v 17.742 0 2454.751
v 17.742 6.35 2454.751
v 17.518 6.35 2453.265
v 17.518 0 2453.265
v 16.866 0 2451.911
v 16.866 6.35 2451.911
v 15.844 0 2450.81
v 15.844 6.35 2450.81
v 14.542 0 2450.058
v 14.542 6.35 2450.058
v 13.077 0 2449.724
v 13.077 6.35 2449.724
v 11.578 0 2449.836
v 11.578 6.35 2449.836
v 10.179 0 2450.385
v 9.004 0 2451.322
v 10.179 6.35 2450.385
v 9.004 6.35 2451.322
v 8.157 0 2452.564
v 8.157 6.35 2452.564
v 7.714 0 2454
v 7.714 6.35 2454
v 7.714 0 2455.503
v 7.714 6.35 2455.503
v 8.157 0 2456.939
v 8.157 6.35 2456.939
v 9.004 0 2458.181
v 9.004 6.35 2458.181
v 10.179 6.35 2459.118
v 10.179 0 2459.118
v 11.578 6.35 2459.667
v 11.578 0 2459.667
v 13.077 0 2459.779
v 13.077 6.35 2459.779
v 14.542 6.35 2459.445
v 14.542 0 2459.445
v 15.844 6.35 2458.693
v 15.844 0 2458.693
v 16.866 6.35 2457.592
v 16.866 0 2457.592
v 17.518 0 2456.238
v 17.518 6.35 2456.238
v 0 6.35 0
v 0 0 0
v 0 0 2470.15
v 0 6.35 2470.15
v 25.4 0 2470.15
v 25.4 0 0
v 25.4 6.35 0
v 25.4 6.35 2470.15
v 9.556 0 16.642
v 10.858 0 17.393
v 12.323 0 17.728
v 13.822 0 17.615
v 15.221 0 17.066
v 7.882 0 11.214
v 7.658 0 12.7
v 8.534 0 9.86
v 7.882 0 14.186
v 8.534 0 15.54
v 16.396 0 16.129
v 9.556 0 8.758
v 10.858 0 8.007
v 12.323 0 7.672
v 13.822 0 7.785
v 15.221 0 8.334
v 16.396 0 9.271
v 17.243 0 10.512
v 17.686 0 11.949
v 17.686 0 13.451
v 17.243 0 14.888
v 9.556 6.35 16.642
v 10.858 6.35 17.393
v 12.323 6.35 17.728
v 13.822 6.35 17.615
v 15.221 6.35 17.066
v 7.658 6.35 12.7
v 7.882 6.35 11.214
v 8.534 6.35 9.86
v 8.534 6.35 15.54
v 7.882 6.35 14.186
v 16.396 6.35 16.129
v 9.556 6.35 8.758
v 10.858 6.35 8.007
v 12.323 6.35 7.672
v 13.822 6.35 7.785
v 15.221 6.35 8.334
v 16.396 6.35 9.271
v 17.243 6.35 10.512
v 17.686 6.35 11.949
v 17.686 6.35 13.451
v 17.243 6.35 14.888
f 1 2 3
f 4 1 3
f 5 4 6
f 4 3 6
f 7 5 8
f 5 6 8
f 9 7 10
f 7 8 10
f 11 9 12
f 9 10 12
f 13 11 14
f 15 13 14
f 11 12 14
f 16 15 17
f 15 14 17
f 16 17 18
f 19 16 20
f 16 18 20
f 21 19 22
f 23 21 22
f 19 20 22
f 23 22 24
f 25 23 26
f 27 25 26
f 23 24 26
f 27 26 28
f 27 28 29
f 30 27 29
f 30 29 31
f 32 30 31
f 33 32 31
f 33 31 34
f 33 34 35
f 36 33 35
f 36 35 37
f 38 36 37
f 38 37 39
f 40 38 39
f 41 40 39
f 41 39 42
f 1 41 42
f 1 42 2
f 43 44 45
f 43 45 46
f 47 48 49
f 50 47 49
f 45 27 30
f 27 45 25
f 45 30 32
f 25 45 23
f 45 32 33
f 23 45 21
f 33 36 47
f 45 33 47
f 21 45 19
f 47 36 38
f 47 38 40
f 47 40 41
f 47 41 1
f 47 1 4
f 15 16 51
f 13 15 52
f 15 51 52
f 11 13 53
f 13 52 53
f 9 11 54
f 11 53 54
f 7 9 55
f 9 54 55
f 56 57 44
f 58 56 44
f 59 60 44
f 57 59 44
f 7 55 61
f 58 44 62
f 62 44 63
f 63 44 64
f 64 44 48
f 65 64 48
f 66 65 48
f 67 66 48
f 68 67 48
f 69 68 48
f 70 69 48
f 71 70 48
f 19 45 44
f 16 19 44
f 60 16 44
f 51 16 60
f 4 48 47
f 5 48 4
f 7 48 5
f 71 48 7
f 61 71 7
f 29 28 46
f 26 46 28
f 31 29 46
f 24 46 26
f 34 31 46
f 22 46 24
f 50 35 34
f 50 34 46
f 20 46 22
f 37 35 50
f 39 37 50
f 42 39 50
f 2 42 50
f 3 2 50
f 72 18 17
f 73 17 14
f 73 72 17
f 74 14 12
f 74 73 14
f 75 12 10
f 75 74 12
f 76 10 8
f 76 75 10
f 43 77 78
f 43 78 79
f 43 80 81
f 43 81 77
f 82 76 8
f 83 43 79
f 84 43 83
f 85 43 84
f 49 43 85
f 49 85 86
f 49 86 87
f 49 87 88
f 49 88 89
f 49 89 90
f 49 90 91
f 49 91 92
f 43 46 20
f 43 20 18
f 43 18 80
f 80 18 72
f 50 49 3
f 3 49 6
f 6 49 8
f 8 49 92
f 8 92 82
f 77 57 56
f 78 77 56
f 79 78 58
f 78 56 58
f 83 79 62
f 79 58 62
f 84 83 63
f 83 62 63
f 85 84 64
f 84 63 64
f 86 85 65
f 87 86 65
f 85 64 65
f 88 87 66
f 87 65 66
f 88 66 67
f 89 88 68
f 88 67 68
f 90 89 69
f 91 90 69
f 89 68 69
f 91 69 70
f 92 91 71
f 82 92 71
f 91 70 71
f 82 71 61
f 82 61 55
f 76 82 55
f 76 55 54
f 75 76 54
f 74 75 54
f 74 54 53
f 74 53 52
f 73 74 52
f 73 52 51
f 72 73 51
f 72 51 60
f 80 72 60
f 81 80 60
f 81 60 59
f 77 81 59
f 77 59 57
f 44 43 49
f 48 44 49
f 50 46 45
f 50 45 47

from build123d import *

# Parameters (mm, degrees)
SKETCH1_W                = 25.4
SKETCH1_H                = 6.35
BOSS_EXTRUDE1_DEPTH      = 2470.15
X_0_397_DIAMETER_HOLE1_D = 10.0838
X_0_397_DIAMETER_HOLE2_D = 10.0838


with BuildPart() as part:
    # Sketch1 → Boss-Extrude1 (new body)
    with BuildSketch(Plane.XY):
        with Locations((12.7, 3.175)):
            Rectangle(SKETCH1_W, SKETCH1_H)
    extrude(amount=BOSS_EXTRUDE1_DEPTH)

    # X (0.397) Diameter Hole1 (through all)
    with Locations(Plane(origin=(0, 6.35, 0), x_dir=(1, 0, 0), z_dir=(0, 1, 0))):
        with Locations((12.7, -12.7)):
            Hole(X_0_397_DIAMETER_HOLE1_D / 2)

    # X (0.397) Diameter Hole2 (through all)
    with Locations(Plane(origin=(0, 0, 0), x_dir=(-1, 0, 0), z_dir=(0, -1, 0))):
        with Locations((-12.7, -2454.751490121)):
            Hole(X_0_397_DIAMETER_HOLE2_D / 2)


solid = part.part
